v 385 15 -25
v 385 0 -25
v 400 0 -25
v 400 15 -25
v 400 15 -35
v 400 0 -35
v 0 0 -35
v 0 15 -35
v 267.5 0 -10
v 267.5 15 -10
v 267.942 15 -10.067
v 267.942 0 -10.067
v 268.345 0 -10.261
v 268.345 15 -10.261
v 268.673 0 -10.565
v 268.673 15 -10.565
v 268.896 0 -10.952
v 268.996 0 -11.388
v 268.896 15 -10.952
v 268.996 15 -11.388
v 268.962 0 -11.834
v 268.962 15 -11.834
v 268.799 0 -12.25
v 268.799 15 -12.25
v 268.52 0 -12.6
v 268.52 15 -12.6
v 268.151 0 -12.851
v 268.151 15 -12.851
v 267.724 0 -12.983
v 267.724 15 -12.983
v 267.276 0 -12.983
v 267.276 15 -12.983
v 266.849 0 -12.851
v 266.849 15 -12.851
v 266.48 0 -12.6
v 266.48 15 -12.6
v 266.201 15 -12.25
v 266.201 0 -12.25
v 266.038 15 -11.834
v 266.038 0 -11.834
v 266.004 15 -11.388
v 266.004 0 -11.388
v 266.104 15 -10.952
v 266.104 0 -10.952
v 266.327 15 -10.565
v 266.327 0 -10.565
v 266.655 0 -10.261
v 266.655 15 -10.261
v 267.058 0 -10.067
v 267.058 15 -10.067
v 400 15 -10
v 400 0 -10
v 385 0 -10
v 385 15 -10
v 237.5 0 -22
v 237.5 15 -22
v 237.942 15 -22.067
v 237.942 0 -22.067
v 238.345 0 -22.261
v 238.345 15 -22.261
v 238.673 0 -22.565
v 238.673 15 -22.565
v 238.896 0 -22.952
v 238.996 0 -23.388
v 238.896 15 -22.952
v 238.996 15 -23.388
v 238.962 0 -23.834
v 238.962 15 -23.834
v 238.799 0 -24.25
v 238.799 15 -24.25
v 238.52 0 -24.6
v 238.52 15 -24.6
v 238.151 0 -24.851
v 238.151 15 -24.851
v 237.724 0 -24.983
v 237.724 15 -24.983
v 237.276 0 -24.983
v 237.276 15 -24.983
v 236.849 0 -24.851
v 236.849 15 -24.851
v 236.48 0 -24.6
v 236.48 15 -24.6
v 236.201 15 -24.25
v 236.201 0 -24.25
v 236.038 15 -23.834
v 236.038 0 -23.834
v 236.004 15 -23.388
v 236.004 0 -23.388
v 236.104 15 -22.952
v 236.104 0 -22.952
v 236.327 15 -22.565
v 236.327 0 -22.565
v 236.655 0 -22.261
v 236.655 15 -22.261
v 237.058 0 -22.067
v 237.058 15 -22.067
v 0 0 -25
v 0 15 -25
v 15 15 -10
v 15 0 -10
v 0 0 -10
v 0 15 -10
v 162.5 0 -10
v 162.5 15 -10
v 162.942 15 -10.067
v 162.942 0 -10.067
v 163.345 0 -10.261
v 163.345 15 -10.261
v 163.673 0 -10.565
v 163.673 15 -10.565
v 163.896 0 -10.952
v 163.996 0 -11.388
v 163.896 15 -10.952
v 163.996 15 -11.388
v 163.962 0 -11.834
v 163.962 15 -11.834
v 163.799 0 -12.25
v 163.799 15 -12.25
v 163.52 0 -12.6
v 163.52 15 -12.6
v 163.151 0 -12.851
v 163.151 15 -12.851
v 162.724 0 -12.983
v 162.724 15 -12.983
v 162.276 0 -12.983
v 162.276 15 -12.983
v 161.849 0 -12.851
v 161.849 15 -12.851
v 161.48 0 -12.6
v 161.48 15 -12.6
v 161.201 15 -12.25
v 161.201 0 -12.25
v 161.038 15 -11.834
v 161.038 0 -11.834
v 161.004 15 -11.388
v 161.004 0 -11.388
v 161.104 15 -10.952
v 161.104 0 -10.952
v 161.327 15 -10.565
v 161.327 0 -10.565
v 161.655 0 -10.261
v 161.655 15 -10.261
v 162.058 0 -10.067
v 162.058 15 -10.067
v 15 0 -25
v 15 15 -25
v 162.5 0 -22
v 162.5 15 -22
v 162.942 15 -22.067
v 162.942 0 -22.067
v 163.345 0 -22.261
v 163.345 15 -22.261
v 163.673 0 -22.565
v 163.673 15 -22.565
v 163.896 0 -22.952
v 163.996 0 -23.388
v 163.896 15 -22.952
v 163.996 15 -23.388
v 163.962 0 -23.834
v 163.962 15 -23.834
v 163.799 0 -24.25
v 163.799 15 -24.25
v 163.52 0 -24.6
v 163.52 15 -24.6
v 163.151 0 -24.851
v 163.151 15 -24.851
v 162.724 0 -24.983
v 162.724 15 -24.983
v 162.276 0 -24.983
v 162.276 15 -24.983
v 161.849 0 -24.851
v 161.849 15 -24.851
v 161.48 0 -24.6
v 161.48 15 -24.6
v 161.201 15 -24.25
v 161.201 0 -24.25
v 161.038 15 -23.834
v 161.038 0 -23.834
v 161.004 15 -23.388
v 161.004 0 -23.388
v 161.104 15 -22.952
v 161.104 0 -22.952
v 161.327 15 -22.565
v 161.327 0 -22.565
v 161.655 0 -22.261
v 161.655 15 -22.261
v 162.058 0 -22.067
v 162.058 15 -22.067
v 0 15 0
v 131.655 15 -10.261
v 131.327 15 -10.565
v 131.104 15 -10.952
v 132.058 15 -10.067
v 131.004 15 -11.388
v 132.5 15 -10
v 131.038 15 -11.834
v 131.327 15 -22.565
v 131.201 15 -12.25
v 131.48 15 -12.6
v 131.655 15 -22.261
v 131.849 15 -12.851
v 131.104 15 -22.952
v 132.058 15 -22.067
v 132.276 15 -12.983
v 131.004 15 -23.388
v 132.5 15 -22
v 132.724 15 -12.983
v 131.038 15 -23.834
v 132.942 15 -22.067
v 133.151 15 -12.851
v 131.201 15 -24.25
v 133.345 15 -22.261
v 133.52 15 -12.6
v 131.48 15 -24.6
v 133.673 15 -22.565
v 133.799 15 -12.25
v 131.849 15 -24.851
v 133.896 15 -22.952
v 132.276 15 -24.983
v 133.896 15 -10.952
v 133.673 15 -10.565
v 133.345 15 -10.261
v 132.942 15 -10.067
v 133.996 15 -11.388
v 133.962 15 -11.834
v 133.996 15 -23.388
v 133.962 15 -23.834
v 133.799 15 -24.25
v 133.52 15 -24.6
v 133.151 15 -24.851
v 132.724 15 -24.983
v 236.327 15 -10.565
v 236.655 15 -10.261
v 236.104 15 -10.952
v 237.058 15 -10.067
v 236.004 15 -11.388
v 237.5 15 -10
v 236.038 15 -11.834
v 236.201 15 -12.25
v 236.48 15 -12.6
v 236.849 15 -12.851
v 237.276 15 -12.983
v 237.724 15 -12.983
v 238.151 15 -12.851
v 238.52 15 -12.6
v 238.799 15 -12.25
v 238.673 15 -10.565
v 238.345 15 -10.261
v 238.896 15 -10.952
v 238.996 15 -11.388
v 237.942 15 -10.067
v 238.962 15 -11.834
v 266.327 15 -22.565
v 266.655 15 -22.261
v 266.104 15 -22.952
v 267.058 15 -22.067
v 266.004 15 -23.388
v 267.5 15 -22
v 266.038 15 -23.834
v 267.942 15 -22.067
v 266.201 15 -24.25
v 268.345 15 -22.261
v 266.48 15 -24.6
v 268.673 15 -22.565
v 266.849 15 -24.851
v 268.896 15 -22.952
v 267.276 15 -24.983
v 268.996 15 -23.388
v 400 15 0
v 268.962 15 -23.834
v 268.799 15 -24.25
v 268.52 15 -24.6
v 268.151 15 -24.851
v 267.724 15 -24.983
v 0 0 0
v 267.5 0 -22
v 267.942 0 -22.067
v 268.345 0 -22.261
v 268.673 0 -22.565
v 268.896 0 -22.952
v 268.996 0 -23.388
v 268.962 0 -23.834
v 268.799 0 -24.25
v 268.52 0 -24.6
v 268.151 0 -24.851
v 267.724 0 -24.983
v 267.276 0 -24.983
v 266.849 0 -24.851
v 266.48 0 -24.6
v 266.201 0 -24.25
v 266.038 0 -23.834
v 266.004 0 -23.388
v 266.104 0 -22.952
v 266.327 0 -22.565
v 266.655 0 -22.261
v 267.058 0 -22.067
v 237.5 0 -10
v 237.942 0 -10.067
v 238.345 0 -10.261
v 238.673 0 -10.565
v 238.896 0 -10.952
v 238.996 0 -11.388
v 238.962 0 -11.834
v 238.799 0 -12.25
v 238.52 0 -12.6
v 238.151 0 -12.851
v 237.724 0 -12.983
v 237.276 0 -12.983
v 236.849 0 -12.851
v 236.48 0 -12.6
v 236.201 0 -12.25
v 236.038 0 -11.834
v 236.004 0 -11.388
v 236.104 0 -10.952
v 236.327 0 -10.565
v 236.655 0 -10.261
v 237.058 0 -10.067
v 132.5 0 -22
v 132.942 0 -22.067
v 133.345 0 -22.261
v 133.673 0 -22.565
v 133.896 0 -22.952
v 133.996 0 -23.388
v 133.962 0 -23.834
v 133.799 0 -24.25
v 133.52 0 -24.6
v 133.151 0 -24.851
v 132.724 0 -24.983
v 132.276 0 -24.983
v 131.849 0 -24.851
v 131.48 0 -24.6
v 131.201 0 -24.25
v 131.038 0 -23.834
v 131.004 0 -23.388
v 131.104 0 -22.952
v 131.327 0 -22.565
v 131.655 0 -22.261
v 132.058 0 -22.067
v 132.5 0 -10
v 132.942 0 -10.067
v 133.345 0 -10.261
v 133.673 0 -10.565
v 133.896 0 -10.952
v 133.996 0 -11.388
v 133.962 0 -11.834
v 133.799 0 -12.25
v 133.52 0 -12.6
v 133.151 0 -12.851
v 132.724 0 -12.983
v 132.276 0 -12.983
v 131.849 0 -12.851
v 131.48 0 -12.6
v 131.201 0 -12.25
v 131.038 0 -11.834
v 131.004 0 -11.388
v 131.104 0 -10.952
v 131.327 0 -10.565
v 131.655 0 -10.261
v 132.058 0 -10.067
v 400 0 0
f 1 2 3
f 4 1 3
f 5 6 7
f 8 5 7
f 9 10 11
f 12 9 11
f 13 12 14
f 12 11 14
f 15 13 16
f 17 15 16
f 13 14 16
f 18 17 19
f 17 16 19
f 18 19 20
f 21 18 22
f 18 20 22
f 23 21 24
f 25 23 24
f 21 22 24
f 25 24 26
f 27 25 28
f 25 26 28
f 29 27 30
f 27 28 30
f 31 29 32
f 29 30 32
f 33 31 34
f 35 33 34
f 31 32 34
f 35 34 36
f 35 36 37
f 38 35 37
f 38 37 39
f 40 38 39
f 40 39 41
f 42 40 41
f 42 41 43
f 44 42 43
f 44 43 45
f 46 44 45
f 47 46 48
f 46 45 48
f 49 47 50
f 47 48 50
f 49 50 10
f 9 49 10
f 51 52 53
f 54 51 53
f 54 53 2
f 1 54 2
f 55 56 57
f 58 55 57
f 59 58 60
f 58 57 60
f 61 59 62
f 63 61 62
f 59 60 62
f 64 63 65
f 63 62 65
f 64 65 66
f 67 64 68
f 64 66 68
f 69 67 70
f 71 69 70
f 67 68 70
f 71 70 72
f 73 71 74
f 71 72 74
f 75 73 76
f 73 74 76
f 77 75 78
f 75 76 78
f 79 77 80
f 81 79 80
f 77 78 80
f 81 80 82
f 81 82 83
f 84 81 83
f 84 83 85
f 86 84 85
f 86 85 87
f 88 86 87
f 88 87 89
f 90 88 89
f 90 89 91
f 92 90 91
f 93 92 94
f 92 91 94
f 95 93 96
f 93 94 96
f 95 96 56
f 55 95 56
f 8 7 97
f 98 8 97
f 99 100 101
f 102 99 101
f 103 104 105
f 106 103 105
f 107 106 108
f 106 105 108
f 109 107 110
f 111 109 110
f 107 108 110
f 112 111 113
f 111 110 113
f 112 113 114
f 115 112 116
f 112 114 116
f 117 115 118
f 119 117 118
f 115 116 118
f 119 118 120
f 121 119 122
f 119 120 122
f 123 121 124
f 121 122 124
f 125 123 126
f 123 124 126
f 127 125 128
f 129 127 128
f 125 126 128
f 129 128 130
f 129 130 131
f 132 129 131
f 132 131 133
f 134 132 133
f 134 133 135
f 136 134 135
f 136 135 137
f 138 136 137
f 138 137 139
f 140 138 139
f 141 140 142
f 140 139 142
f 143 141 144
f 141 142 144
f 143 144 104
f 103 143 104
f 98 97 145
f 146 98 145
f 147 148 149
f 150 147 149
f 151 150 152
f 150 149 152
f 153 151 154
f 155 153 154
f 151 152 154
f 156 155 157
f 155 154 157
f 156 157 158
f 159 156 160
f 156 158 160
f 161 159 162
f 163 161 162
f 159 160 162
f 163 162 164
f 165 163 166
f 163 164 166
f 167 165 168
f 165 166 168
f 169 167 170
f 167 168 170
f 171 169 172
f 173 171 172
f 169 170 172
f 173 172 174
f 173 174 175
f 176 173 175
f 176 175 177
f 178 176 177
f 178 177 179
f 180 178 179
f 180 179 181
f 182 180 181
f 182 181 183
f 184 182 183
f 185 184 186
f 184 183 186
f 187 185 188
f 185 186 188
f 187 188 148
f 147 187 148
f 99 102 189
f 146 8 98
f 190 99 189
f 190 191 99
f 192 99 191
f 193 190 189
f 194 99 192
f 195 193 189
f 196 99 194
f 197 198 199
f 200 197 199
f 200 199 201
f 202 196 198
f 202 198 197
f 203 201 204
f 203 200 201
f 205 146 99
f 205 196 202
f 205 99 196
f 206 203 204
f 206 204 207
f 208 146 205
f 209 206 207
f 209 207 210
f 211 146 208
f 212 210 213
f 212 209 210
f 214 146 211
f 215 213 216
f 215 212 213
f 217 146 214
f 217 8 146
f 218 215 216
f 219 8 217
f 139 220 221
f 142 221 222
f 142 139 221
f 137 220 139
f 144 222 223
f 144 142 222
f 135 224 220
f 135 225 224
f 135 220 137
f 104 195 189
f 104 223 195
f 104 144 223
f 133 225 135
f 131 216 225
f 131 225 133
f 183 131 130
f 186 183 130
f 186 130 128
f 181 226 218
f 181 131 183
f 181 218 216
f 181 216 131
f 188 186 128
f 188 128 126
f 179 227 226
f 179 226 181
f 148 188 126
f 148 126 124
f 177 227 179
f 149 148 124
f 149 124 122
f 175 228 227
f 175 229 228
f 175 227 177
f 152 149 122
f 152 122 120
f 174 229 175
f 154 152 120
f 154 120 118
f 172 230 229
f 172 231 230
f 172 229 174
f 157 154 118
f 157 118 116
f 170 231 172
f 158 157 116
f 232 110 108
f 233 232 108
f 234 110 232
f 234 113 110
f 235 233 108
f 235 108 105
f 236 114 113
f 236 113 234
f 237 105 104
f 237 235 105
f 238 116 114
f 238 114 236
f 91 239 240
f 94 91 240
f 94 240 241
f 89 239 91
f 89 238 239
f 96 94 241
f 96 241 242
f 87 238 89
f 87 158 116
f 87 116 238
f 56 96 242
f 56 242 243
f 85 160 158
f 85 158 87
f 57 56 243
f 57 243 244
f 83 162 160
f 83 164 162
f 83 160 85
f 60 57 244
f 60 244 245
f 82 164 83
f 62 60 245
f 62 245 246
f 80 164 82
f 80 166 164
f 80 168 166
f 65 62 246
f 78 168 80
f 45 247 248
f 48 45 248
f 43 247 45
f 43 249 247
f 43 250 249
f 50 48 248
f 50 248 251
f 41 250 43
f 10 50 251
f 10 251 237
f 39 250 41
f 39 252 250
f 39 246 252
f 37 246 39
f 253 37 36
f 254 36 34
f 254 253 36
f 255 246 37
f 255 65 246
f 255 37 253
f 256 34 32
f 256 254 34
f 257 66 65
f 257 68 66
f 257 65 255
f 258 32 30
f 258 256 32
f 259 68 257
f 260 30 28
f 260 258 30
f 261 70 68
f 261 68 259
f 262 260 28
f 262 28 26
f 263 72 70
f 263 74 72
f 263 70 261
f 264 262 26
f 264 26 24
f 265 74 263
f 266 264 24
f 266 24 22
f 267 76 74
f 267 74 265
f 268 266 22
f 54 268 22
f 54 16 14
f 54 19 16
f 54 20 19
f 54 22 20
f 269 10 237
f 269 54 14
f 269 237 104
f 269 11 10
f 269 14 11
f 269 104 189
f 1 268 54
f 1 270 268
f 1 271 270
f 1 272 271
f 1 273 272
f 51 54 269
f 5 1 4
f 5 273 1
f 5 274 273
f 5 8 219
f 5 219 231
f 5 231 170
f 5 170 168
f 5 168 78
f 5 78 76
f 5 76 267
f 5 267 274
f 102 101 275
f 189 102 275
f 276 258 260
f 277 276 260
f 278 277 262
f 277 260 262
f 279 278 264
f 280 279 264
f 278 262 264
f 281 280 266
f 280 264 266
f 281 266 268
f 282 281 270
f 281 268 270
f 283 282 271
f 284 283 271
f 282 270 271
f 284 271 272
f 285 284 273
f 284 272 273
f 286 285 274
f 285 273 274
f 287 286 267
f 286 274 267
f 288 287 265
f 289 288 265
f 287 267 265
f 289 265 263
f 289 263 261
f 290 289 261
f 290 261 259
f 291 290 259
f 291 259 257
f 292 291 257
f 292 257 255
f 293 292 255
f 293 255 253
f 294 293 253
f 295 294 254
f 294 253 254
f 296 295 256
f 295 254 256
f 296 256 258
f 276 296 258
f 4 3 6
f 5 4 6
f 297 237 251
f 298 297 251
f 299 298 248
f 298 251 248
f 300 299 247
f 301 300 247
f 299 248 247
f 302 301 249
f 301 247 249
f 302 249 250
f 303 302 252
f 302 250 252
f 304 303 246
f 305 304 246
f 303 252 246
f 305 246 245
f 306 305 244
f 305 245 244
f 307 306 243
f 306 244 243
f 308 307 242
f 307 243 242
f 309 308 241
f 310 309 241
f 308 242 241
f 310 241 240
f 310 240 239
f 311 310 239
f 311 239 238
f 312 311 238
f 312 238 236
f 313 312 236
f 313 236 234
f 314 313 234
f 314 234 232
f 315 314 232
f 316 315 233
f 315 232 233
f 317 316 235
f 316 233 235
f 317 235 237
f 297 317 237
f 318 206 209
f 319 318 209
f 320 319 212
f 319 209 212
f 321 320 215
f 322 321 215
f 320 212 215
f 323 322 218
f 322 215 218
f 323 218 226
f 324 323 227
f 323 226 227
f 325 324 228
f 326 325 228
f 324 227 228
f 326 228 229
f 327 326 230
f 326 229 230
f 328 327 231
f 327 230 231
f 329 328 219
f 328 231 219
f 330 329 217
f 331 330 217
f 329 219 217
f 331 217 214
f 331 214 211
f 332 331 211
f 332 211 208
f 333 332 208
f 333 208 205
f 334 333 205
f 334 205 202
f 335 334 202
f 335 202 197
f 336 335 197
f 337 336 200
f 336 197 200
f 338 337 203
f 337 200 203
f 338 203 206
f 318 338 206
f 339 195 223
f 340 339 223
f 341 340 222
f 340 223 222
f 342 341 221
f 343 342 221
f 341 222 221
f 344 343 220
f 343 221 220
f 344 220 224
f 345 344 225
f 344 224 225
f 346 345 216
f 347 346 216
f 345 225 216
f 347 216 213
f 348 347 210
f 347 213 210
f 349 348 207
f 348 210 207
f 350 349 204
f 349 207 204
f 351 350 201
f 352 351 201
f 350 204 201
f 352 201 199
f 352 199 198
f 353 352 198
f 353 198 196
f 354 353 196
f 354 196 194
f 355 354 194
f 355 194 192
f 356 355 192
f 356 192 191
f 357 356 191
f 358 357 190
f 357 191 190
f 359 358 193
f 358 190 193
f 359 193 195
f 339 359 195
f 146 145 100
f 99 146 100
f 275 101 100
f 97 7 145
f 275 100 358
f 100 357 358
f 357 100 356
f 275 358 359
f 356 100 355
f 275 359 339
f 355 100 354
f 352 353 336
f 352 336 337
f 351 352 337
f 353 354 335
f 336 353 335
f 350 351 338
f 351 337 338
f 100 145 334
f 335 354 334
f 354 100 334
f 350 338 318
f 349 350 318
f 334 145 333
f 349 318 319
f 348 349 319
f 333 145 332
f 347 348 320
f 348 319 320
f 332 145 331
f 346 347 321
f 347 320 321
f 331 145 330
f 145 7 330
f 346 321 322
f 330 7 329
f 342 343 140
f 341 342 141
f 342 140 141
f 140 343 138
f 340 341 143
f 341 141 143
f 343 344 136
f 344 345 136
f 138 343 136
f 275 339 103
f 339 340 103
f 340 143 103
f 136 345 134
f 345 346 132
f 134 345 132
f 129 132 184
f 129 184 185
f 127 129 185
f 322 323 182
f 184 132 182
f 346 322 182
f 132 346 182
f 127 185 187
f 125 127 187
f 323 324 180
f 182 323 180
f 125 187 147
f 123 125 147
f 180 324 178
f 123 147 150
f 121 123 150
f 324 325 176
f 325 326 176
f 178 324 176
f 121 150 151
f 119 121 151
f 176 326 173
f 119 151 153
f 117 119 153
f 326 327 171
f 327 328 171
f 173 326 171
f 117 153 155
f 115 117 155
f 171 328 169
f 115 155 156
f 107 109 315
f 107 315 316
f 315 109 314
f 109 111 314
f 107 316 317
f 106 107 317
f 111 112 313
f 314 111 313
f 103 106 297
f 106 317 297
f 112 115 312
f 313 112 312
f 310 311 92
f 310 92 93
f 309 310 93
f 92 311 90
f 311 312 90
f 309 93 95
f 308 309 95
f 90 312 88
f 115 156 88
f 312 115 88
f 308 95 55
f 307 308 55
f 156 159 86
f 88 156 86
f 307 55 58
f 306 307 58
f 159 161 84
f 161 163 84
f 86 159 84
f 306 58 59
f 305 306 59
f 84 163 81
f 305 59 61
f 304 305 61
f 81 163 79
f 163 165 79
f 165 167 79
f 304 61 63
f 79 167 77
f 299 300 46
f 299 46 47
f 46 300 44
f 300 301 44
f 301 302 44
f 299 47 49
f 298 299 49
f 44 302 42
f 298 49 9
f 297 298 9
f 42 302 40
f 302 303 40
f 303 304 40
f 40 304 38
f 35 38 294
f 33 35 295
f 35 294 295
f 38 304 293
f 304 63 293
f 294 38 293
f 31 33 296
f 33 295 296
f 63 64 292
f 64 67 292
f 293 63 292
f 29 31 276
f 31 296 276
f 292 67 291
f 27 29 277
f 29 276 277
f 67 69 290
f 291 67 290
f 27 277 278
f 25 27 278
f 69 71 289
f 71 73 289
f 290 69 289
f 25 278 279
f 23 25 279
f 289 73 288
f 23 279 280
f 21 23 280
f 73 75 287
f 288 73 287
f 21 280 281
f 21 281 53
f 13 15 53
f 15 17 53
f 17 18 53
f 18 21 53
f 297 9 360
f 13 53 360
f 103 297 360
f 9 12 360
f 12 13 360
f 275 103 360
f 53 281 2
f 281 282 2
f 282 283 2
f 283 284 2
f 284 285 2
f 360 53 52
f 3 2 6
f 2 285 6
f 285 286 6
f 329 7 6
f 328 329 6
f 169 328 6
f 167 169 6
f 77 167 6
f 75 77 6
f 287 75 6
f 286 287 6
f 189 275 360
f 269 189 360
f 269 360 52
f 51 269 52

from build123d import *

# Parameters (mm, degrees)
EXTRUDE_1_DEPTH     = 15
SKETCH_4_R          = 1.5
CUT_EXTRUDE_1_DEPTH = 15


with BuildPart() as part:
    # 草图3 → 凸台-拉伸1 (new body)
    with BuildSketch(Plane(origin=(0, 0, 0), x_dir=(1, 0, 0), z_dir=(0, 1, 0))):
        Polygon((0, 0), (400, 0), (400, 10), (385, 10), (385, 25), (400, 25), (400, 35), (0, 35), (0, 25), (15, 25), (15, 10), (0, 10), align=None)
    extrude(amount=EXTRUDE_1_DEPTH)

    # 草图4 → 切除-拉伸1 (cut)
    with BuildSketch(Plane(origin=(0, 15, 0), x_dir=(1, 0, 0), z_dir=(0, 1, 0))):
        with Locations(Location((267.5, 11.5, 0), (0, 0, 270))):
            Circle(SKETCH_4_R)
        with Locations(Location((267.5, 23.5, 0), (0, 0, 270))):
            Circle(SKETCH_4_R)
        with Locations(Location((237.5, 11.5, 0), (0, 0, 270))):
            Circle(SKETCH_4_R)
        with Locations(Location((237.5, 23.5, 0), (0, 0, 270))):
            Circle(SKETCH_4_R)
        with Locations(Location((162.5, 11.5, 0), (0, 0, 270))):
            Circle(SKETCH_4_R)
        with Locations(Location((132.5, 11.5, 0), (0, 0, 270))):
            Circle(SKETCH_4_R)
        with Locations(Location((132.5, 23.5, 0), (0, 0, 270))):
            Circle(SKETCH_4_R)
        with Locations(Location((162.5, 23.5, 0), (0, 0, 270))):
            Circle(SKETCH_4_R)
    extrude(amount=-CUT_EXTRUDE_1_DEPTH, mode=Mode.SUBTRACT)


solid = part.part
